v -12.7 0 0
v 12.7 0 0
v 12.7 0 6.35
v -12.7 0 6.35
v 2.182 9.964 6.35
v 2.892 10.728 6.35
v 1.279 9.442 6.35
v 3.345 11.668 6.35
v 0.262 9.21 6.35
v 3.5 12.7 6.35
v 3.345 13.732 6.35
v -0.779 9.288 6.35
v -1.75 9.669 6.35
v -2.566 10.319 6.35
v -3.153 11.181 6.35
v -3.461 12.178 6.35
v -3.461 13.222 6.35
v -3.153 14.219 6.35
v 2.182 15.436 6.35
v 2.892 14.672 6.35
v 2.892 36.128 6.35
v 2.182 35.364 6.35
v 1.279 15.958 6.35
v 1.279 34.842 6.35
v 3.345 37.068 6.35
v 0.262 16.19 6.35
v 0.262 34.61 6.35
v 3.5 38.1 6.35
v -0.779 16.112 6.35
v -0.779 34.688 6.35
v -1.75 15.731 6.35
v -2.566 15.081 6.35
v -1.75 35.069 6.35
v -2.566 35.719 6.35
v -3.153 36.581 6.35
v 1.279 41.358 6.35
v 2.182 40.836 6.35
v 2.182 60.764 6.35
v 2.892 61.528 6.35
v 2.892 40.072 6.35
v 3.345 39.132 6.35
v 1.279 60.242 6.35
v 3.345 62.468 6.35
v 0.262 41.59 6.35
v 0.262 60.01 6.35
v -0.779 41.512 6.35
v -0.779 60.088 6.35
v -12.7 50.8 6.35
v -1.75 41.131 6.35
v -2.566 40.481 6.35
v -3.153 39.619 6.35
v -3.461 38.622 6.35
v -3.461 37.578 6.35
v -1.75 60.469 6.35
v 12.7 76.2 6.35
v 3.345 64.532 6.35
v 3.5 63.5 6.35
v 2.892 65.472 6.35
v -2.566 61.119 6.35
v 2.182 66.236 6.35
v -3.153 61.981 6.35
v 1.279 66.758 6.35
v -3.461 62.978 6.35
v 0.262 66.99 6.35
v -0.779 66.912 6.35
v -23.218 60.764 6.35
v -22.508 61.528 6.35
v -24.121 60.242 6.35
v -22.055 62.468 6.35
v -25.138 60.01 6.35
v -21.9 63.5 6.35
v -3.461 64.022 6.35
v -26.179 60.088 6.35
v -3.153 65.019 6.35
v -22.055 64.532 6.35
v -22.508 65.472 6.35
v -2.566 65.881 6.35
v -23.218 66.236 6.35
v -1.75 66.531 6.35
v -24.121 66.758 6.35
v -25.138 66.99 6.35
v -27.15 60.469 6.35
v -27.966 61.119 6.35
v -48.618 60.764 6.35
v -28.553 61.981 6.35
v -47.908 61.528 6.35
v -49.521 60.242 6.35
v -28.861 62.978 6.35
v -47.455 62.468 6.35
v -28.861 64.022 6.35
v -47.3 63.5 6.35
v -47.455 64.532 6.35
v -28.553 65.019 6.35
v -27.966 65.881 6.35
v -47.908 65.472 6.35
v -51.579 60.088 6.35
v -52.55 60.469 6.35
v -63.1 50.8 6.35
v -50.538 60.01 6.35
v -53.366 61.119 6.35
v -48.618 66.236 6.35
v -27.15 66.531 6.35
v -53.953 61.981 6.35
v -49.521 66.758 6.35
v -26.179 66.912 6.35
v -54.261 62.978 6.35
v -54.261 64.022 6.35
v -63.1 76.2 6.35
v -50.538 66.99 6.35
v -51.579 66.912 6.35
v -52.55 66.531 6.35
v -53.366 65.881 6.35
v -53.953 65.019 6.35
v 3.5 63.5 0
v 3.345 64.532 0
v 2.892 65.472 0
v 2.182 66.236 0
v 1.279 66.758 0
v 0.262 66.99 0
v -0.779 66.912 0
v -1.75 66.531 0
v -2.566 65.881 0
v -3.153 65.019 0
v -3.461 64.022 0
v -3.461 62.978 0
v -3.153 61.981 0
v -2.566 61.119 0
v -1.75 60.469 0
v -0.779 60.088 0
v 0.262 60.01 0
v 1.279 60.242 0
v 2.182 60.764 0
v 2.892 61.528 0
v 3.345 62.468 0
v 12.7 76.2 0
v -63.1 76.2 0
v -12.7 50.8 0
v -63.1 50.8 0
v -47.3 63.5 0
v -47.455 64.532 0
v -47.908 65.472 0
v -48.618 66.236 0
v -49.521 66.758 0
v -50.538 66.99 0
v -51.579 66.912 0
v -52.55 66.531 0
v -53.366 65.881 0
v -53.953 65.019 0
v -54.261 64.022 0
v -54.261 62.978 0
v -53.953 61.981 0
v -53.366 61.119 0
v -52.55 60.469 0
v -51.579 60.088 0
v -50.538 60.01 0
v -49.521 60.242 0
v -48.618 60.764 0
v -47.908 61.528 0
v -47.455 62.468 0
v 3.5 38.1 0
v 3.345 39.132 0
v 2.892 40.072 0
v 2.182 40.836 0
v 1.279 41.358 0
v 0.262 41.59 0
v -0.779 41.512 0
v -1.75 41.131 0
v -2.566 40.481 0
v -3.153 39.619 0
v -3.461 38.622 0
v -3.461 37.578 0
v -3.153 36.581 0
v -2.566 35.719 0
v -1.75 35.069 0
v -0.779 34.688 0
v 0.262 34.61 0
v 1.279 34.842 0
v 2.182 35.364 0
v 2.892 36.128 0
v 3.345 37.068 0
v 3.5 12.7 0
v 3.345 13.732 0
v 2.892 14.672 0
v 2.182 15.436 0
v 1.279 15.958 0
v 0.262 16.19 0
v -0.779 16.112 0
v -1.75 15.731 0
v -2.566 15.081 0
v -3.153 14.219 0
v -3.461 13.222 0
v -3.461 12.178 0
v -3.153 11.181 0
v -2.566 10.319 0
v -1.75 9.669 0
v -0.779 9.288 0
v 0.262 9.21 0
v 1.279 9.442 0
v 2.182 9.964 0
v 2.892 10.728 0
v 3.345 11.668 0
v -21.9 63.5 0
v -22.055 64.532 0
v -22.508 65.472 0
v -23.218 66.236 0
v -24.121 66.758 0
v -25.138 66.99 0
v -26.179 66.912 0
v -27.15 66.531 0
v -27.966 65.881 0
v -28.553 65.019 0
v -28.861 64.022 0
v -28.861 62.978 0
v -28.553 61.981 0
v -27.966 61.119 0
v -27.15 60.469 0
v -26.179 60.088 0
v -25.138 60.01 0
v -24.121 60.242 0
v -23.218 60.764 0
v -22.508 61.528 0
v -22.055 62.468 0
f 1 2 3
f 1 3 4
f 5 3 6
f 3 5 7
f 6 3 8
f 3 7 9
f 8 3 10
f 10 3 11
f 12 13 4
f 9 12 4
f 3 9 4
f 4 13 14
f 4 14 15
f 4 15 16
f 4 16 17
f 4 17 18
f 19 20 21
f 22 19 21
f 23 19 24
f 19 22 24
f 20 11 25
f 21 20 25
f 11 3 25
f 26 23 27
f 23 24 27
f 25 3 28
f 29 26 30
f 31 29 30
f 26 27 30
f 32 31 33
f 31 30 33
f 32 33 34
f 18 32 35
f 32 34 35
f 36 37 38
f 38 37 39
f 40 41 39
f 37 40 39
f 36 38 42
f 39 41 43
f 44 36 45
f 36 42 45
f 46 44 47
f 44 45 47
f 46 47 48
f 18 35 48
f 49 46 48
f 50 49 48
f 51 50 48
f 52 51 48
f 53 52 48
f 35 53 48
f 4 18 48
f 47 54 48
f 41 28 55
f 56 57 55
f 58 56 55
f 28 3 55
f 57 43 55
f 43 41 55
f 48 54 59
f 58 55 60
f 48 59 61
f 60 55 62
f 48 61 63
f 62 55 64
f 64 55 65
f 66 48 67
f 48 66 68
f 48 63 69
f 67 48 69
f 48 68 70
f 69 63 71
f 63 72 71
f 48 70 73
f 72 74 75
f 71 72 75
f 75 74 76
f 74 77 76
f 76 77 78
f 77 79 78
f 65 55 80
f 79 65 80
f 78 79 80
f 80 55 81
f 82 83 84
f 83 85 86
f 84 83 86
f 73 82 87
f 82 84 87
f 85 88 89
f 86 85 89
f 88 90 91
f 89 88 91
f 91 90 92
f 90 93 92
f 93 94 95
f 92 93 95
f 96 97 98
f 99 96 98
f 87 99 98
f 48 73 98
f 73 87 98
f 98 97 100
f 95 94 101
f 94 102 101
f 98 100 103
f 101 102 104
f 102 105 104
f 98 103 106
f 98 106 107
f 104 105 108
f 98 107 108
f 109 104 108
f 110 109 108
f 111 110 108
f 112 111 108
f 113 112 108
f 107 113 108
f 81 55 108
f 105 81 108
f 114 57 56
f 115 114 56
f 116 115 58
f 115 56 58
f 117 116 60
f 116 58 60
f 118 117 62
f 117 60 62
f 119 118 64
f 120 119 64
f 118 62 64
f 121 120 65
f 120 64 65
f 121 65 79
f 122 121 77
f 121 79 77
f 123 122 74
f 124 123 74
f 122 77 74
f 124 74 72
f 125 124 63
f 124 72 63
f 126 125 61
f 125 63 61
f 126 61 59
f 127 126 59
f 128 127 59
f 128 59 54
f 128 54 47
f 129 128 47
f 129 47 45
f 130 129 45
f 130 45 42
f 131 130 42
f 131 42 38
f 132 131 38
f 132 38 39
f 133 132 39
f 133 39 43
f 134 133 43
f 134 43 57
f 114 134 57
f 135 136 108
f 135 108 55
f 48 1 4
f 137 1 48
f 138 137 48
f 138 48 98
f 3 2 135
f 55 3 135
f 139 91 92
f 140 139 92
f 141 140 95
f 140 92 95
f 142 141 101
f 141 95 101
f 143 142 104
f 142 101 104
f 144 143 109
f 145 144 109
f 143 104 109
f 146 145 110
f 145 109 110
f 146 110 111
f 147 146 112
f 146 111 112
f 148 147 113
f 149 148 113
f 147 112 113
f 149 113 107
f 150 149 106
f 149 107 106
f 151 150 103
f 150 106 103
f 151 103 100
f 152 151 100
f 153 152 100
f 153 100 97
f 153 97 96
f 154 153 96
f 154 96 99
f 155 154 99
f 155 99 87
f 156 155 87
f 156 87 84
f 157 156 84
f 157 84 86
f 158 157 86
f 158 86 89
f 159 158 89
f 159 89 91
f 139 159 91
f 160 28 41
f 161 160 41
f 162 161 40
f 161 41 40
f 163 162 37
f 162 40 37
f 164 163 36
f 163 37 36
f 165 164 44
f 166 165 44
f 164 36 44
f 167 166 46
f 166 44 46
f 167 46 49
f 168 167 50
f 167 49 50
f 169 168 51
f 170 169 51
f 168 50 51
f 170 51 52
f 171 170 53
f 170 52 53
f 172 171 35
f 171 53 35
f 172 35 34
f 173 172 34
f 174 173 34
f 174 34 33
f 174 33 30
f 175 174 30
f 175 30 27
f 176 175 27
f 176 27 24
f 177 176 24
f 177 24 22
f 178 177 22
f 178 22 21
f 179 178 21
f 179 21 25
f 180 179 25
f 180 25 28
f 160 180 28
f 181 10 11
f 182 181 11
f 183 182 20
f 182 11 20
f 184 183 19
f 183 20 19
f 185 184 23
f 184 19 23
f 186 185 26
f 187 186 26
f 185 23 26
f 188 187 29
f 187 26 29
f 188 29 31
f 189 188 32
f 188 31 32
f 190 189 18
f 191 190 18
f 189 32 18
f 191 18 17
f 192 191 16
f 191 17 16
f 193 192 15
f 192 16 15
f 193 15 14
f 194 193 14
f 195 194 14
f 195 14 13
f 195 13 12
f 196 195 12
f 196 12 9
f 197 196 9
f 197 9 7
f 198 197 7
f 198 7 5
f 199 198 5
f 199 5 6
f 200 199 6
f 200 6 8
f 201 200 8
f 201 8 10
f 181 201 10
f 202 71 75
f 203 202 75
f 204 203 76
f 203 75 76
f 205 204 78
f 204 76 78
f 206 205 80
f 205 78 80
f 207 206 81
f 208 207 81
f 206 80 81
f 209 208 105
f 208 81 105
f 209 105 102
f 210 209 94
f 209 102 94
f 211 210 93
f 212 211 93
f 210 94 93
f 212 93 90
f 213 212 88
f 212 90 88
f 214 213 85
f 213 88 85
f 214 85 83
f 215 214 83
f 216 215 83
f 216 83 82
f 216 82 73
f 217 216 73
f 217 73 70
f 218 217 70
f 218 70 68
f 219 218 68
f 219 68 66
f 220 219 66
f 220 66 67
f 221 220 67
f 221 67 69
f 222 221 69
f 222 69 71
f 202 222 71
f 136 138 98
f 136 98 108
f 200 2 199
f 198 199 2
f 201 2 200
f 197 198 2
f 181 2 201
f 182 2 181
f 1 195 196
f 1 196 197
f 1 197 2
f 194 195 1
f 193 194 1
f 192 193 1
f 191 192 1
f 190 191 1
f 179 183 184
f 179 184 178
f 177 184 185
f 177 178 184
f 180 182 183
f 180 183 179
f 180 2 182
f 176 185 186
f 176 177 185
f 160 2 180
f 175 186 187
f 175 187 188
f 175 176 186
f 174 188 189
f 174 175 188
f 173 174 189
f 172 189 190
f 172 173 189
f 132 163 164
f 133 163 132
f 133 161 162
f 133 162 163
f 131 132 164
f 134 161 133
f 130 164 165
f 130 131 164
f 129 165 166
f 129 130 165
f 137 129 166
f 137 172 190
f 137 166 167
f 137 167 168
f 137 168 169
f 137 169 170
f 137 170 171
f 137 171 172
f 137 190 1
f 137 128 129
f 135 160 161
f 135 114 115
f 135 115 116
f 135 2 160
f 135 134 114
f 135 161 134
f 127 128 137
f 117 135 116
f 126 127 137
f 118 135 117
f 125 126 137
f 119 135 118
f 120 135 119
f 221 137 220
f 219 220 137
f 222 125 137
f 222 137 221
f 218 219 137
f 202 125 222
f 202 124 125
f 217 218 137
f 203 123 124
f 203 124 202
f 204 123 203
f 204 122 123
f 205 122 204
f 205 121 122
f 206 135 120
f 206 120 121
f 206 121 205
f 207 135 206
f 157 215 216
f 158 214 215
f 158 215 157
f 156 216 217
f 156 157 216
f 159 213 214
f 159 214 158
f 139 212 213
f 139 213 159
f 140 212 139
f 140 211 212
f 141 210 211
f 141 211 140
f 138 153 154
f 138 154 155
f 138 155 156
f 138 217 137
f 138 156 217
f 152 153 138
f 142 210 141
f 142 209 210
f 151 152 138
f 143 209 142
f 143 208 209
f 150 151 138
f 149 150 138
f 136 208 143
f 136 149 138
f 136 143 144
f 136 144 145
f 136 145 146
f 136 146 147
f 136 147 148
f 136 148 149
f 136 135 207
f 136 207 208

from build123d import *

# Parameters (mm, degrees)
BOSS_EXTRUDE1_DEPTH = 6.35
SKETCH2_R           = 3.5
CUT_EXTRUDE1_DEPTH  = 7.35


with BuildPart() as part:
    # Sketch1 → Boss-Extrude1 (new body)
    with BuildSketch(Plane.XY):
        Polygon((12.7, 0), (-12.7, 0), (-12.7, 50.8), (-63.1, 50.8), (-63.1, 76.2), (12.7, 76.2), (12.7, 50.8), align=None)
    extrude(amount=BOSS_EXTRUDE1_DEPTH)

    # Sketch2 → Cut-Extrude1 (cut, through all)
    with BuildSketch(Plane.XY.offset(6.35)):
        with Locations((0, 63.5)):
            Circle(SKETCH2_R)
        with Locations((-25.4, 63.5)):
            Circle(SKETCH2_R)
        with Locations((0, 38.1)):
            Circle(SKETCH2_R)
        with Locations((0, 12.7)):
            Circle(SKETCH2_R)
        with Locations((-50.8, 63.5)):
            Circle(SKETCH2_R)
    extrude(amount=-CUT_EXTRUDE1_DEPTH, mode=Mode.SUBTRACT)


solid = part.part
